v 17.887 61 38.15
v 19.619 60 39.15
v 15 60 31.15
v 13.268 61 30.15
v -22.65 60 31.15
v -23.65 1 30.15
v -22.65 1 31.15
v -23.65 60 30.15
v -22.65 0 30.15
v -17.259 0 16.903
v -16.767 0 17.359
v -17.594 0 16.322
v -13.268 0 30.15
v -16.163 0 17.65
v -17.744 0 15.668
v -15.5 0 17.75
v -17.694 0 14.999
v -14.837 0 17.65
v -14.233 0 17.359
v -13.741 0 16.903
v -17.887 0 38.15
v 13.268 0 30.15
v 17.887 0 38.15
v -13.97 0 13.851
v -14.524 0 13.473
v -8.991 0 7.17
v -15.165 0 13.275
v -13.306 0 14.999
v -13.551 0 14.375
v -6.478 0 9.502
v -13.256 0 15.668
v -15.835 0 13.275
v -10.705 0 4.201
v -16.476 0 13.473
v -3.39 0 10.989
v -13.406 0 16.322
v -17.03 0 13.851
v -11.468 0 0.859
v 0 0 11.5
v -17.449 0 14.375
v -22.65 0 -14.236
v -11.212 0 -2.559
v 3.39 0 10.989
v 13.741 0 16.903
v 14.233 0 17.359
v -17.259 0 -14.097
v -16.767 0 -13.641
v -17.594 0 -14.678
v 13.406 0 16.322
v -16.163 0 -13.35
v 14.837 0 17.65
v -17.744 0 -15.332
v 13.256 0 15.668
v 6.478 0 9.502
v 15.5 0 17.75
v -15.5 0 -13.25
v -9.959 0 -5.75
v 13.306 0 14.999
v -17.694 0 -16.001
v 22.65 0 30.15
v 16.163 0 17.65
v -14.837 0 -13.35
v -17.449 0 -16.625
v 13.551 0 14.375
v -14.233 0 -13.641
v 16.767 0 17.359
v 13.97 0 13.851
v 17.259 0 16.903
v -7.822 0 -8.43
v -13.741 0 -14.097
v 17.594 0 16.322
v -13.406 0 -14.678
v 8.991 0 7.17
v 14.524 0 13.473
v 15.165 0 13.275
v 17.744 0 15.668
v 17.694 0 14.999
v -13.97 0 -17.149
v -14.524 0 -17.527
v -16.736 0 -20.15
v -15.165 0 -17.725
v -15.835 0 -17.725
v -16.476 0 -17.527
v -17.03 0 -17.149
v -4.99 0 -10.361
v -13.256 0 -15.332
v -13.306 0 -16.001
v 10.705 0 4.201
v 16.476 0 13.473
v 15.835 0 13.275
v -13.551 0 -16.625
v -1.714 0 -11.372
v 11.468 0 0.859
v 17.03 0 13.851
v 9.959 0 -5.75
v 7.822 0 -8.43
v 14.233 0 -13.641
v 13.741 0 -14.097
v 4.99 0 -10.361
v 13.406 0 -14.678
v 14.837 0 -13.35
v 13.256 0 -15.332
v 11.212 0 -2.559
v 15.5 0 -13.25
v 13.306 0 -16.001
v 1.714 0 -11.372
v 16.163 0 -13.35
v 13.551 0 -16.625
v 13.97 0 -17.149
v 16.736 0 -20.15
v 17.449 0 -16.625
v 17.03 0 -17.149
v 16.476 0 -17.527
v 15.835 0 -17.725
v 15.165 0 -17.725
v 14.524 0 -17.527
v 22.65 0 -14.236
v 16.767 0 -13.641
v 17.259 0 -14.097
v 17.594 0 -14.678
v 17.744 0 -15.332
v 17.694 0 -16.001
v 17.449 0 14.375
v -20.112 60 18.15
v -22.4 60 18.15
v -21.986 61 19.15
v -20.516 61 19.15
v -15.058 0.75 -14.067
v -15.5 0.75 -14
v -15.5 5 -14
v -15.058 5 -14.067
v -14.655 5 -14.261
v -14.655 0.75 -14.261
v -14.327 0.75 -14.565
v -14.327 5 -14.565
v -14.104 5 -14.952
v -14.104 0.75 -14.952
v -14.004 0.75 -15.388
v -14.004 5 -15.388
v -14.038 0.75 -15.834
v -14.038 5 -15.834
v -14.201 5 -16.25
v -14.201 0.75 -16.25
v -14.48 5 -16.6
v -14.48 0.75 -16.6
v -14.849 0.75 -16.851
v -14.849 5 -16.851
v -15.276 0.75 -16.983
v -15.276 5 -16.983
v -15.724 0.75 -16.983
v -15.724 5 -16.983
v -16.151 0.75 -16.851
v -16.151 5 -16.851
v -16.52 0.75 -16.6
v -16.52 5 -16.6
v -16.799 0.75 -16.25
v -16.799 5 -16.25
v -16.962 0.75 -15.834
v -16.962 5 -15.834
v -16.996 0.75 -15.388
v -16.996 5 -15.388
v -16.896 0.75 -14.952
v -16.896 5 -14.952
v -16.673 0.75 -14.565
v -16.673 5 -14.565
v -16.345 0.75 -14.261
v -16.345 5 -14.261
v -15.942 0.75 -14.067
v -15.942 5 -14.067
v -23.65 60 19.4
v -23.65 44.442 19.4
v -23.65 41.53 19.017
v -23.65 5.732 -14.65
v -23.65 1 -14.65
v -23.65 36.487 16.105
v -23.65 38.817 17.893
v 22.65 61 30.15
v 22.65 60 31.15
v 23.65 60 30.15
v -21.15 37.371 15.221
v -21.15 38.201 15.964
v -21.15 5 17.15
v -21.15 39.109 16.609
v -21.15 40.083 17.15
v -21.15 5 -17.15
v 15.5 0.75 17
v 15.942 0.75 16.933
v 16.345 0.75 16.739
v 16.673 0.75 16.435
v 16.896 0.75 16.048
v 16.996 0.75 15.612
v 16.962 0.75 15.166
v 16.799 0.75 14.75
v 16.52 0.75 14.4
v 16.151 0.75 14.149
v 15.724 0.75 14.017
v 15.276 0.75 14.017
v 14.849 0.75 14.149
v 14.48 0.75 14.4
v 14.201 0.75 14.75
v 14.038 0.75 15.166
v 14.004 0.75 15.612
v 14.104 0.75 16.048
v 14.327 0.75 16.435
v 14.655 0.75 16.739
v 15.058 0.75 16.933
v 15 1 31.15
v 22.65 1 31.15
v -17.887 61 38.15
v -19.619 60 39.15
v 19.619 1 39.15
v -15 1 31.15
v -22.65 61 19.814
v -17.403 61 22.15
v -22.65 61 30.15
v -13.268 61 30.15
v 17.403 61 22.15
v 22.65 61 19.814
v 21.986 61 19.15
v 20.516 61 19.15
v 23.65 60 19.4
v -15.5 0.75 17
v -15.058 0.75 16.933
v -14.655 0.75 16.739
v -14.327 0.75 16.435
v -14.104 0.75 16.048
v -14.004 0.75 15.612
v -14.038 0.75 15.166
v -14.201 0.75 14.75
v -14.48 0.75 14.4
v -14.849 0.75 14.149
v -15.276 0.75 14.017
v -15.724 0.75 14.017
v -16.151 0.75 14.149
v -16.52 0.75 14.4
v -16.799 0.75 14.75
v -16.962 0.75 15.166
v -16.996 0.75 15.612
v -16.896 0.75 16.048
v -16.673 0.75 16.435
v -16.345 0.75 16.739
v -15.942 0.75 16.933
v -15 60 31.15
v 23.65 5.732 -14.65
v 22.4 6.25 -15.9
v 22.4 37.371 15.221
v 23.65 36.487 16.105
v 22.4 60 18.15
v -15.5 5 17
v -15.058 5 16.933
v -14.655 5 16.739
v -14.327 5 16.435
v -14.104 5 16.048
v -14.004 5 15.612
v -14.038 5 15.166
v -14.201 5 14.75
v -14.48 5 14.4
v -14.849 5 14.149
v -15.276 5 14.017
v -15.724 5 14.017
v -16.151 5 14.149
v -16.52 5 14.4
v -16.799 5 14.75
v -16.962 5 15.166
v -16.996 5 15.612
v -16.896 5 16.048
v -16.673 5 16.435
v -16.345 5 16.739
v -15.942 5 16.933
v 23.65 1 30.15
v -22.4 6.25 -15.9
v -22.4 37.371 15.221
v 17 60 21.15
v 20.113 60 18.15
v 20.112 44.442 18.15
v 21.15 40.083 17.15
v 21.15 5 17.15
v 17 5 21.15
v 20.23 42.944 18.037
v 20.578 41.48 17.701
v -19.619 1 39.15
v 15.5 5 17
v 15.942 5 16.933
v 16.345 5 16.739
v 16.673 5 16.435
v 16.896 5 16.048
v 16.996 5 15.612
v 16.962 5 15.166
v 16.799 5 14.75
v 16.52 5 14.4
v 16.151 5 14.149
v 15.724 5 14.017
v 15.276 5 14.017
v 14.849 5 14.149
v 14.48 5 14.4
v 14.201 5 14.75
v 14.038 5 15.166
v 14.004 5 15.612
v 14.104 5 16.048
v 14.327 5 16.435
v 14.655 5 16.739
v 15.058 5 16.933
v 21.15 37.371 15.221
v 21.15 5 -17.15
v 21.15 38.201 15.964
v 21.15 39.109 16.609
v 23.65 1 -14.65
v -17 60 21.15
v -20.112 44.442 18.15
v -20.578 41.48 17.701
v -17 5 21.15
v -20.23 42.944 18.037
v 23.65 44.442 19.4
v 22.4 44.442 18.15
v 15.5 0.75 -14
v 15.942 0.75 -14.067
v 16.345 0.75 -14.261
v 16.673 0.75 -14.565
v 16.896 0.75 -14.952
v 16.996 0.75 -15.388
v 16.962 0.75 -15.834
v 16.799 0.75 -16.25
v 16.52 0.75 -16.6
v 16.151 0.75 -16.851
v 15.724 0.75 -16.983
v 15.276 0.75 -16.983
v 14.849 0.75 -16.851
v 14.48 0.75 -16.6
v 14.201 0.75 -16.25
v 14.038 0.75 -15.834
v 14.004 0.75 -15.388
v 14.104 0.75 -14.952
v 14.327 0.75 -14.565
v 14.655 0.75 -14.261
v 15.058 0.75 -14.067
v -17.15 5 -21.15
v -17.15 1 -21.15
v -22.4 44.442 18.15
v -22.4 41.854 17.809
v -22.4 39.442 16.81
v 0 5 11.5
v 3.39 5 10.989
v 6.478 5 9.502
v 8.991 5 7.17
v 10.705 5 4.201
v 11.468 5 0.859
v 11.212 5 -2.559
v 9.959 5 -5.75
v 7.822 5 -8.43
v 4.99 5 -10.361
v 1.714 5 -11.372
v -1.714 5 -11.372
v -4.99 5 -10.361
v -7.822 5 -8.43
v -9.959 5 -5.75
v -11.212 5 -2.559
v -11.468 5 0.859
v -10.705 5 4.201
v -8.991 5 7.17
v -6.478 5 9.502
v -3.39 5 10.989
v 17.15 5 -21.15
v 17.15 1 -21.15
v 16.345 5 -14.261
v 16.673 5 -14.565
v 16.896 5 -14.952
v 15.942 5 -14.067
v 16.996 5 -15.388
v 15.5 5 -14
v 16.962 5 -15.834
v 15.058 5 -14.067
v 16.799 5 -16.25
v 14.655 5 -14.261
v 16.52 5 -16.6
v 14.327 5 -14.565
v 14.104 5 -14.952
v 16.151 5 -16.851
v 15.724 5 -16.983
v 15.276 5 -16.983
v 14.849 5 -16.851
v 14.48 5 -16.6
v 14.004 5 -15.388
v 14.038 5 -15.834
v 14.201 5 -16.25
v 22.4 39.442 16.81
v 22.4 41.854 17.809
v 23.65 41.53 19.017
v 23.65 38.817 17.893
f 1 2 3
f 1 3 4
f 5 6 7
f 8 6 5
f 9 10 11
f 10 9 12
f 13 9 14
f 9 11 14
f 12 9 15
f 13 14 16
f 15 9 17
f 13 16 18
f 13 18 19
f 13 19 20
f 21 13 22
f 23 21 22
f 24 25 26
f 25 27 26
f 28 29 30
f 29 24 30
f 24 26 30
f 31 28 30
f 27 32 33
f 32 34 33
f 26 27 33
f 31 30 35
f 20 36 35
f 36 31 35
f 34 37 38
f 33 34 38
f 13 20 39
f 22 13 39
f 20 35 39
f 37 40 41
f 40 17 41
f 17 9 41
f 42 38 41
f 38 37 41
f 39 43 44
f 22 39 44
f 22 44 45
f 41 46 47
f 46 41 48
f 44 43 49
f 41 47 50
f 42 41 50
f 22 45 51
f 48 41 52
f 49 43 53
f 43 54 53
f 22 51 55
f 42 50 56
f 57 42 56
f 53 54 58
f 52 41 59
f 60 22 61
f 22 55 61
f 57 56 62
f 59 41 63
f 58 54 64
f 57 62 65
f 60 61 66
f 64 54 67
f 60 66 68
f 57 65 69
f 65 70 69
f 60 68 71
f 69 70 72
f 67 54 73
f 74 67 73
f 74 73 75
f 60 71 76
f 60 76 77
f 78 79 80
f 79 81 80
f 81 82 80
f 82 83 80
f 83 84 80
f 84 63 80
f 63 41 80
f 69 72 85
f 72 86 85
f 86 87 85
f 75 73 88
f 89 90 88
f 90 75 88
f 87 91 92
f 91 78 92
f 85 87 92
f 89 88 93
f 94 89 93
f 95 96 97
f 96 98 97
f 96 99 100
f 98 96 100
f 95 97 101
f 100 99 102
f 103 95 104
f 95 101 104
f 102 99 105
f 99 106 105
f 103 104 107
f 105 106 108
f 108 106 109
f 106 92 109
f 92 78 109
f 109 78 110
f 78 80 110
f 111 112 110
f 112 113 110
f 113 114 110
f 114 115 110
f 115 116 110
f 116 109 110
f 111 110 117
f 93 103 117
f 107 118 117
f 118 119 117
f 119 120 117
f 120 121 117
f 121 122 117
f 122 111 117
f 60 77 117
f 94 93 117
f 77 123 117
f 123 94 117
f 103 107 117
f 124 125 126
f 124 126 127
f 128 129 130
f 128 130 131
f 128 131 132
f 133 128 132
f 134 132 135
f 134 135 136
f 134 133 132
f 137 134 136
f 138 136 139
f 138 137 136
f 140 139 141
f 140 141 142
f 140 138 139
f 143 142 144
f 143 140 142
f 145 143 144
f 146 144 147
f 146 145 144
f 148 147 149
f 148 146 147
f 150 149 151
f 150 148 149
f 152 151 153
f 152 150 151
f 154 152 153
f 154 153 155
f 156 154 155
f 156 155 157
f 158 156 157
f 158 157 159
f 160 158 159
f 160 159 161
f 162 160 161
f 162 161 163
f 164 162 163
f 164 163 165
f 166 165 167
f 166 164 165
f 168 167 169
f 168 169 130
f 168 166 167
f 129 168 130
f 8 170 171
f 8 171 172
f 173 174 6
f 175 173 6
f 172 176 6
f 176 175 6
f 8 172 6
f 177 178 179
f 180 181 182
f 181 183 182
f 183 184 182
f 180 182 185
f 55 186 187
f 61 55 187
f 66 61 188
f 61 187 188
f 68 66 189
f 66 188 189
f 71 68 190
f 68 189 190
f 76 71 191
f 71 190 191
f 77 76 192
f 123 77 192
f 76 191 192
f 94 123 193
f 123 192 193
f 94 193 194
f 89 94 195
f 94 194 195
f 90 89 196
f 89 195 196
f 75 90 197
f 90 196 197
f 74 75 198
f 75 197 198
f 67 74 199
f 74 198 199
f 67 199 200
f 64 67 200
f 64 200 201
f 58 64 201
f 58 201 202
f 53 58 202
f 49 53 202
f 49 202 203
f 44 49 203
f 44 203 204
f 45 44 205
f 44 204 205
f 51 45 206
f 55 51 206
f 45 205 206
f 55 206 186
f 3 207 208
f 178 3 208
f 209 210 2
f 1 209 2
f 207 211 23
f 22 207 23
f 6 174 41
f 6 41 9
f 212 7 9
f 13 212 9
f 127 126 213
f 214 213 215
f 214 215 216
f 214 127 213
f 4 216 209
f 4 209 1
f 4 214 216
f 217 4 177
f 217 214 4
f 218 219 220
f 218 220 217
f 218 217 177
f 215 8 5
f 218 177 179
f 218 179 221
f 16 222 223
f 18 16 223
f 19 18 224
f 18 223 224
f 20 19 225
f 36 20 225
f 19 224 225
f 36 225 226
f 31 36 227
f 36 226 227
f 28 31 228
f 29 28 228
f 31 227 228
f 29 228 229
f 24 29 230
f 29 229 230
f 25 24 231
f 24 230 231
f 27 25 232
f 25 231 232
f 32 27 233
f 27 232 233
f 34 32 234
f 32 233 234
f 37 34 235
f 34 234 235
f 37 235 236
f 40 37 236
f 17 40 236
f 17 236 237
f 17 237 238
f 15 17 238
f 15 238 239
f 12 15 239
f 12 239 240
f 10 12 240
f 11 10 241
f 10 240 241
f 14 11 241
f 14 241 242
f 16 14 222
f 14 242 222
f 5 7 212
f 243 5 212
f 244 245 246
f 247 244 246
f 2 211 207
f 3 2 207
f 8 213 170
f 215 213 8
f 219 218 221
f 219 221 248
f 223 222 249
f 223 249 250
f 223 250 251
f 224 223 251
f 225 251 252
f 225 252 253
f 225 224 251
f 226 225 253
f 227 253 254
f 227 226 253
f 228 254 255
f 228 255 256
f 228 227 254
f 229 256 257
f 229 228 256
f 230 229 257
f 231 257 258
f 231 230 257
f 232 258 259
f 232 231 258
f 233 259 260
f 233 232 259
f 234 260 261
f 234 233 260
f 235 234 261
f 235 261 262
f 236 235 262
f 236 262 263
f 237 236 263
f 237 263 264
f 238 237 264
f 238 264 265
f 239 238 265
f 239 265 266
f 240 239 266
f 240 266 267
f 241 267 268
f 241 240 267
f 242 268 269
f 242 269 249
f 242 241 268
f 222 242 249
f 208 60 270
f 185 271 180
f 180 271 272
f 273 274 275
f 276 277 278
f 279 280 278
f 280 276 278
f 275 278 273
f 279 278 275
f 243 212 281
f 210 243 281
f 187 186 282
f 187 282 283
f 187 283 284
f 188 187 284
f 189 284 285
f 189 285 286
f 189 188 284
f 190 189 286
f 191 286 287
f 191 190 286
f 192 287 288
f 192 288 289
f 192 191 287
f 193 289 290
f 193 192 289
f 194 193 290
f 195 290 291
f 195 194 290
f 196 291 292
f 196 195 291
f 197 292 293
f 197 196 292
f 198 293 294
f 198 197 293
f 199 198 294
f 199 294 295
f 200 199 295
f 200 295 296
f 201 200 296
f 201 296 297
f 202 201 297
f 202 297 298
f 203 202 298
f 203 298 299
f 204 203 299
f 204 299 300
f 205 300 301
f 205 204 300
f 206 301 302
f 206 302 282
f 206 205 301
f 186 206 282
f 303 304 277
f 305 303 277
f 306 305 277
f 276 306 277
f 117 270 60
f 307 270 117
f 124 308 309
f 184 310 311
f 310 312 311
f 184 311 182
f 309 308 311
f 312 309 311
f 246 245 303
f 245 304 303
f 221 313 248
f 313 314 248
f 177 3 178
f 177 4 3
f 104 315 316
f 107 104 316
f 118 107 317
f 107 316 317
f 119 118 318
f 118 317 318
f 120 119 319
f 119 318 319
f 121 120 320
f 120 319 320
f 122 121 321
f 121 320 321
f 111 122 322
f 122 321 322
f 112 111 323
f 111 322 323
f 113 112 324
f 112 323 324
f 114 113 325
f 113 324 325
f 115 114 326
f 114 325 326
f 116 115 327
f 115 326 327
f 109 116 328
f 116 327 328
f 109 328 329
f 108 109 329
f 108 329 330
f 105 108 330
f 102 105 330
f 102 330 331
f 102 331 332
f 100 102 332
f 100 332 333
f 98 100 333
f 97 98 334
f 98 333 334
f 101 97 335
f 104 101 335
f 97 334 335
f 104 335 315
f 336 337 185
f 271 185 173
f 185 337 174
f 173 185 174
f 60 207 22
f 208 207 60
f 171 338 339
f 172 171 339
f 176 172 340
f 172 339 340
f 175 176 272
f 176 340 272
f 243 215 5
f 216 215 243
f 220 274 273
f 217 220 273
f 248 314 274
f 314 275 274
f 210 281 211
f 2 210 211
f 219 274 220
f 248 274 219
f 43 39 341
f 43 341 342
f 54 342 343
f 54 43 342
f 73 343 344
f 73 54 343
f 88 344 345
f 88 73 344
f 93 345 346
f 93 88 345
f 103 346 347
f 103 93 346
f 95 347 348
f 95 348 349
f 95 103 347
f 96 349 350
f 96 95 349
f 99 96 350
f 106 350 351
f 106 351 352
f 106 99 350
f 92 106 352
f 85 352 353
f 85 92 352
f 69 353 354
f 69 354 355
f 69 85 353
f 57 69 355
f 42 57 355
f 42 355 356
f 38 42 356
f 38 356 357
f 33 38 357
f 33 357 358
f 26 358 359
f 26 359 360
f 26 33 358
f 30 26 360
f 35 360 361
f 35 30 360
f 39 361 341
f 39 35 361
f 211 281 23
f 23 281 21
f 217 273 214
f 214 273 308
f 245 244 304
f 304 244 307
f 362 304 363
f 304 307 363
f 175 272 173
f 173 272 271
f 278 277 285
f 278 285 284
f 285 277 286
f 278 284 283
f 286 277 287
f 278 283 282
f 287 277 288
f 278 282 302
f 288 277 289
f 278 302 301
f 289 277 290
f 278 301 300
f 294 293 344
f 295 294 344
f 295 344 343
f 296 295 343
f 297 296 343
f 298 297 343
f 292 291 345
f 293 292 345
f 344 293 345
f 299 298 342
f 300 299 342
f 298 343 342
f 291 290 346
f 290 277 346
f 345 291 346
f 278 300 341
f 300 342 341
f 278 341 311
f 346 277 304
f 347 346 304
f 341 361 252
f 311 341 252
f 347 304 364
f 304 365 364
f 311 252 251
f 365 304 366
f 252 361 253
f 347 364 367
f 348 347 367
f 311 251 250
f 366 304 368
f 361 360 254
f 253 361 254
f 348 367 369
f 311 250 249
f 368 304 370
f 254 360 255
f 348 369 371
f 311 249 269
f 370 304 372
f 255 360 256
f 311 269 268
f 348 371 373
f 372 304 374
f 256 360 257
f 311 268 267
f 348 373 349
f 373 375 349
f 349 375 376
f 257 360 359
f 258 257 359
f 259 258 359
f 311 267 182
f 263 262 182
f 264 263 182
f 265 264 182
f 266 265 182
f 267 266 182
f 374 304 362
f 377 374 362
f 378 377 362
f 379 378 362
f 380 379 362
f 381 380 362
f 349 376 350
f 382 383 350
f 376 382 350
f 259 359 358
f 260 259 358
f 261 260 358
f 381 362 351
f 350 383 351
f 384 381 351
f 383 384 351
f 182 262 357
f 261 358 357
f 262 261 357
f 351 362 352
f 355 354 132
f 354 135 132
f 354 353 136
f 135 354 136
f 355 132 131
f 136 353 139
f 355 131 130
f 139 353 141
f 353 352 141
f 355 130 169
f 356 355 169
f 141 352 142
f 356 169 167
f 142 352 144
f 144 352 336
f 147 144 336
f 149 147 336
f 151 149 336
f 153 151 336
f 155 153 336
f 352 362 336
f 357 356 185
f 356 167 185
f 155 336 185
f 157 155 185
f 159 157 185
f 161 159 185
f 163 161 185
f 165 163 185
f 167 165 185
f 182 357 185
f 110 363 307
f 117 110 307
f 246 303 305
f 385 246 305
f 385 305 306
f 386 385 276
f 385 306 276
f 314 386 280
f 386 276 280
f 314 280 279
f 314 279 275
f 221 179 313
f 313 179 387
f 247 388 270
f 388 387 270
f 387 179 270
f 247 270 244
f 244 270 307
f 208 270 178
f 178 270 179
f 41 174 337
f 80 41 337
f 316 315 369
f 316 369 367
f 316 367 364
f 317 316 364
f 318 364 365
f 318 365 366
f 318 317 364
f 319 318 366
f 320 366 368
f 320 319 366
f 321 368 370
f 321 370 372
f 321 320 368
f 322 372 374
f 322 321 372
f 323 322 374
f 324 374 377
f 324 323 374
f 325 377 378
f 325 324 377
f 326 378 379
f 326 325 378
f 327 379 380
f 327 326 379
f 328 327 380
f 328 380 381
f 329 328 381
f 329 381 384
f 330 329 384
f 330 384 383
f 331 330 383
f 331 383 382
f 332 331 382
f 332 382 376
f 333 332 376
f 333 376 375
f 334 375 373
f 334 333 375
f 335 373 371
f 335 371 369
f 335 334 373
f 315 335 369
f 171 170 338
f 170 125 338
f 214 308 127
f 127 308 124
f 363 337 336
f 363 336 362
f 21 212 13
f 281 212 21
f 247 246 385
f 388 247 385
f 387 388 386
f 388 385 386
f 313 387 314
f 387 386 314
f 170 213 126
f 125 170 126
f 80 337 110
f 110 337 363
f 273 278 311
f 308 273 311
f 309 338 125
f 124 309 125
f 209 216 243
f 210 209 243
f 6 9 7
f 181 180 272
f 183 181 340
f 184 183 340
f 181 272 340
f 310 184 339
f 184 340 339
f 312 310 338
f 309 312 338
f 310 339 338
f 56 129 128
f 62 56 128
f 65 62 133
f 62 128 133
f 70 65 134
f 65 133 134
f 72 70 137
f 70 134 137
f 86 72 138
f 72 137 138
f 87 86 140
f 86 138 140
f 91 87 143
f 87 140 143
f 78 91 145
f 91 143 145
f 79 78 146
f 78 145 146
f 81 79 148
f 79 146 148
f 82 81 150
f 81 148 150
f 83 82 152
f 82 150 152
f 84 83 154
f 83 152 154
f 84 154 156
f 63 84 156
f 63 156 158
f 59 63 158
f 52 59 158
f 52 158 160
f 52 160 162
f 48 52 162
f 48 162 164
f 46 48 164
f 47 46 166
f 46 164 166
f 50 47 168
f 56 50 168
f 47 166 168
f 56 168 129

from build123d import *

# Parameters (mm, degrees)
SKETCH1_R                       = 1.5
SKETCH1_R_2                     = 11.5
BRACKET_FACE_EXTRUDE_DEPTH      = 5
BRACKET_BODY_EXTRUDE_DEPTH      = 61
BRACKET_SIDE_TRIM_DEPTH         = 73.461334517
BRACKET_SIDE_TRIM_DEPTH_BACK    = 73.461334517
BRACKET_SIDE_EDGE_CHAMFER_SIZE  = 1.25
BRACKET_MOUNT_HOLE_CHAMFER_SIZE = 0.75
SLIDE_TAB_EXTRUDE_DEPTH         = 61
BRACKET_FACE_CHAMFER_SIZE       = 1


with BuildPart() as part:
    # Sketch1 → Bracket Face Extrude (new body)
    with BuildSketch(Plane(origin=(0, 0, 0), x_dir=(1, 0, 0), z_dir=(0, 1, 0))):
        Polygon((-21.15, 17.15), (-17.15, 21.15), (17.15, 21.15), (21.15, 17.15), (21.15, -17.15), (17, -21.15), (-17, -21.15), (-21.15, -17.15), align=None)
        with Locations(Location((-15.5, 15.5, 0), (0, 0, 270))):
            Circle(SKETCH1_R, mode=Mode.SUBTRACT)
        with Locations(Location((15.5, 15.5, 0), (0, 0, 270))):
            Circle(SKETCH1_R, mode=Mode.SUBTRACT)
        with Locations(Location((15.5, -15.5, 0), (0, 0, 270))):
            Circle(SKETCH1_R, mode=Mode.SUBTRACT)
        with Locations(Location((-15.5, -15.5, 0), (0, 0, 270))):
            Circle(SKETCH1_R, mode=Mode.SUBTRACT)
        with Locations(Location((0, 0, 0), (0, 0, 270))):
            Circle(SKETCH1_R_2, mode=Mode.SUBTRACT)
    extrude(amount=BRACKET_FACE_EXTRUDE_DEPTH)

    # Sketch5 → Bracket Body Extrude (add)
    with BuildSketch(Plane(origin=(0, 0, 0), x_dir=(1, 0, 0), z_dir=(0, 1, 0))):
        Polygon((-23.65, -18.212588103), (-23.65, -31.15), (23.65, -31.15), (23.65, -18.212588103), (23.65, 14.65), (21.15, 17.15), (21.15, -17.15), (17, -21.15), (-17, -21.15), (-21.15, -17.15), (-21.15, 17.15), (-23.65, 14.65), align=None)
    extrude(amount=BRACKET_BODY_EXTRUDE_DEPTH)

    # Sketch6 → Bracket Side Trim (cut, two sides: drawn at the far end of the back side and taken through both)
    with BuildSketch(Plane(origin=(0, 0, 0), x_dir=(0, 0, -1), z_dir=(1, 0, 0)).offset(-BRACKET_SIDE_TRIM_DEPTH_BACK)):
        with BuildLine():
            Line((17.15, 5), (-15.221067812, 37.371067812))
            ThreePointArc((-15.221067812, 37.371067812), (-17.388795325, 40.6153013), (-18.15, 44.442135624))
            Line((-18.15, 44.442135624), (-18.15, 61))
            Line((-18.15, 61), (17.15, 61))
            Line((17.15, 61), (17.15, 5))
        make_face()
    extrude(amount=BRACKET_SIDE_TRIM_DEPTH + BRACKET_SIDE_TRIM_DEPTH_BACK, mode=Mode.SUBTRACT)

    # Bracket Side Edge Chamfer
    bracket_side_edge_chamfer_edges = [part.edges().sort_by_distance(p)[0] for p in [
        (-23.65, 22.435533906, 0.285533906),
        (-23.65, 40.6153013, 17.388795325),
        (-23.65, 52.721067812, 18.15),
        (23.65, 52.721067812, 18.15),
        (23.65, 40.6153013, 17.388795325),
        (23.65, 22.435533906, 0.285533906),
    ]]
    chamfer(bracket_side_edge_chamfer_edges, length=BRACKET_SIDE_EDGE_CHAMFER_SIZE)

    # Bracket Mount Hole Chamfer
    bracket_mount_hole_chamfer_edges = [part.edges().sort_by_distance(p)[0] for p in [
        (-15.5, 0, -17),
        (15.5, 0, -17),
        (15.5, 0, 14),
        (-15.5, 0, 14),
    ]]
    chamfer(bracket_mount_hole_chamfer_edges, length=BRACKET_MOUNT_HOLE_CHAMFER_SIZE)

    # Sketch9 → Slide Tab Extrude (add)
    with BuildSketch(Plane(origin=(0, 0, 0), x_dir=(1, 0, 0), z_dir=(0, 1, 0))):
        Polygon((-15, -31.15), (-19.618802154, -39.15), (19.618802154, -39.15), (15, -31.15), align=None)
    extrude(amount=SLIDE_TAB_EXTRUDE_DEPTH)

    # Bracket Face Chamfer
    bracket_face_chamfer_edges = [part.edges().sort_by_distance(p)[0] for p in [
        (-23.65, 61, 25.275),
        (-21.25625, 61, 18.15),
        (23.025, 61, 18.775),
        (-23.025, 61, 18.775),
        (19.325, 0, 31.15),
        (19.325, 61, 31.15),
        (-17.309401077, 0, 35.15),
        (0, 0, 39.15),
        (17.309401077, 0, 35.15),
        (17.309401077, 61, 35.15),
        (-17.309401077, 61, 35.15),
        (0, 61, 39.15),
        (-23.65, 0, 8.25),
        (-19.325, 0, 31.15),
        (-23.65, 30.5, 31.15),
        (23.65, 0, 8.25),
        (23.65, 30.5, 31.15),
        (-19.325, 61, 31.15),
        (23.65, 61, 25.275),
        (0, 61, 21.15),
        (-18.55625, 61, 19.65),
        (18.55625, 61, 19.65),
        (21.25625, 61, 18.15),
        (-20.4, 0, -17.9),
        (0, 0, -21.15),
        (20.4, 0, -17.9),
    ]]
    chamfer(bracket_face_chamfer_edges, length=BRACKET_FACE_CHAMFER_SIZE)


solid = part.part
